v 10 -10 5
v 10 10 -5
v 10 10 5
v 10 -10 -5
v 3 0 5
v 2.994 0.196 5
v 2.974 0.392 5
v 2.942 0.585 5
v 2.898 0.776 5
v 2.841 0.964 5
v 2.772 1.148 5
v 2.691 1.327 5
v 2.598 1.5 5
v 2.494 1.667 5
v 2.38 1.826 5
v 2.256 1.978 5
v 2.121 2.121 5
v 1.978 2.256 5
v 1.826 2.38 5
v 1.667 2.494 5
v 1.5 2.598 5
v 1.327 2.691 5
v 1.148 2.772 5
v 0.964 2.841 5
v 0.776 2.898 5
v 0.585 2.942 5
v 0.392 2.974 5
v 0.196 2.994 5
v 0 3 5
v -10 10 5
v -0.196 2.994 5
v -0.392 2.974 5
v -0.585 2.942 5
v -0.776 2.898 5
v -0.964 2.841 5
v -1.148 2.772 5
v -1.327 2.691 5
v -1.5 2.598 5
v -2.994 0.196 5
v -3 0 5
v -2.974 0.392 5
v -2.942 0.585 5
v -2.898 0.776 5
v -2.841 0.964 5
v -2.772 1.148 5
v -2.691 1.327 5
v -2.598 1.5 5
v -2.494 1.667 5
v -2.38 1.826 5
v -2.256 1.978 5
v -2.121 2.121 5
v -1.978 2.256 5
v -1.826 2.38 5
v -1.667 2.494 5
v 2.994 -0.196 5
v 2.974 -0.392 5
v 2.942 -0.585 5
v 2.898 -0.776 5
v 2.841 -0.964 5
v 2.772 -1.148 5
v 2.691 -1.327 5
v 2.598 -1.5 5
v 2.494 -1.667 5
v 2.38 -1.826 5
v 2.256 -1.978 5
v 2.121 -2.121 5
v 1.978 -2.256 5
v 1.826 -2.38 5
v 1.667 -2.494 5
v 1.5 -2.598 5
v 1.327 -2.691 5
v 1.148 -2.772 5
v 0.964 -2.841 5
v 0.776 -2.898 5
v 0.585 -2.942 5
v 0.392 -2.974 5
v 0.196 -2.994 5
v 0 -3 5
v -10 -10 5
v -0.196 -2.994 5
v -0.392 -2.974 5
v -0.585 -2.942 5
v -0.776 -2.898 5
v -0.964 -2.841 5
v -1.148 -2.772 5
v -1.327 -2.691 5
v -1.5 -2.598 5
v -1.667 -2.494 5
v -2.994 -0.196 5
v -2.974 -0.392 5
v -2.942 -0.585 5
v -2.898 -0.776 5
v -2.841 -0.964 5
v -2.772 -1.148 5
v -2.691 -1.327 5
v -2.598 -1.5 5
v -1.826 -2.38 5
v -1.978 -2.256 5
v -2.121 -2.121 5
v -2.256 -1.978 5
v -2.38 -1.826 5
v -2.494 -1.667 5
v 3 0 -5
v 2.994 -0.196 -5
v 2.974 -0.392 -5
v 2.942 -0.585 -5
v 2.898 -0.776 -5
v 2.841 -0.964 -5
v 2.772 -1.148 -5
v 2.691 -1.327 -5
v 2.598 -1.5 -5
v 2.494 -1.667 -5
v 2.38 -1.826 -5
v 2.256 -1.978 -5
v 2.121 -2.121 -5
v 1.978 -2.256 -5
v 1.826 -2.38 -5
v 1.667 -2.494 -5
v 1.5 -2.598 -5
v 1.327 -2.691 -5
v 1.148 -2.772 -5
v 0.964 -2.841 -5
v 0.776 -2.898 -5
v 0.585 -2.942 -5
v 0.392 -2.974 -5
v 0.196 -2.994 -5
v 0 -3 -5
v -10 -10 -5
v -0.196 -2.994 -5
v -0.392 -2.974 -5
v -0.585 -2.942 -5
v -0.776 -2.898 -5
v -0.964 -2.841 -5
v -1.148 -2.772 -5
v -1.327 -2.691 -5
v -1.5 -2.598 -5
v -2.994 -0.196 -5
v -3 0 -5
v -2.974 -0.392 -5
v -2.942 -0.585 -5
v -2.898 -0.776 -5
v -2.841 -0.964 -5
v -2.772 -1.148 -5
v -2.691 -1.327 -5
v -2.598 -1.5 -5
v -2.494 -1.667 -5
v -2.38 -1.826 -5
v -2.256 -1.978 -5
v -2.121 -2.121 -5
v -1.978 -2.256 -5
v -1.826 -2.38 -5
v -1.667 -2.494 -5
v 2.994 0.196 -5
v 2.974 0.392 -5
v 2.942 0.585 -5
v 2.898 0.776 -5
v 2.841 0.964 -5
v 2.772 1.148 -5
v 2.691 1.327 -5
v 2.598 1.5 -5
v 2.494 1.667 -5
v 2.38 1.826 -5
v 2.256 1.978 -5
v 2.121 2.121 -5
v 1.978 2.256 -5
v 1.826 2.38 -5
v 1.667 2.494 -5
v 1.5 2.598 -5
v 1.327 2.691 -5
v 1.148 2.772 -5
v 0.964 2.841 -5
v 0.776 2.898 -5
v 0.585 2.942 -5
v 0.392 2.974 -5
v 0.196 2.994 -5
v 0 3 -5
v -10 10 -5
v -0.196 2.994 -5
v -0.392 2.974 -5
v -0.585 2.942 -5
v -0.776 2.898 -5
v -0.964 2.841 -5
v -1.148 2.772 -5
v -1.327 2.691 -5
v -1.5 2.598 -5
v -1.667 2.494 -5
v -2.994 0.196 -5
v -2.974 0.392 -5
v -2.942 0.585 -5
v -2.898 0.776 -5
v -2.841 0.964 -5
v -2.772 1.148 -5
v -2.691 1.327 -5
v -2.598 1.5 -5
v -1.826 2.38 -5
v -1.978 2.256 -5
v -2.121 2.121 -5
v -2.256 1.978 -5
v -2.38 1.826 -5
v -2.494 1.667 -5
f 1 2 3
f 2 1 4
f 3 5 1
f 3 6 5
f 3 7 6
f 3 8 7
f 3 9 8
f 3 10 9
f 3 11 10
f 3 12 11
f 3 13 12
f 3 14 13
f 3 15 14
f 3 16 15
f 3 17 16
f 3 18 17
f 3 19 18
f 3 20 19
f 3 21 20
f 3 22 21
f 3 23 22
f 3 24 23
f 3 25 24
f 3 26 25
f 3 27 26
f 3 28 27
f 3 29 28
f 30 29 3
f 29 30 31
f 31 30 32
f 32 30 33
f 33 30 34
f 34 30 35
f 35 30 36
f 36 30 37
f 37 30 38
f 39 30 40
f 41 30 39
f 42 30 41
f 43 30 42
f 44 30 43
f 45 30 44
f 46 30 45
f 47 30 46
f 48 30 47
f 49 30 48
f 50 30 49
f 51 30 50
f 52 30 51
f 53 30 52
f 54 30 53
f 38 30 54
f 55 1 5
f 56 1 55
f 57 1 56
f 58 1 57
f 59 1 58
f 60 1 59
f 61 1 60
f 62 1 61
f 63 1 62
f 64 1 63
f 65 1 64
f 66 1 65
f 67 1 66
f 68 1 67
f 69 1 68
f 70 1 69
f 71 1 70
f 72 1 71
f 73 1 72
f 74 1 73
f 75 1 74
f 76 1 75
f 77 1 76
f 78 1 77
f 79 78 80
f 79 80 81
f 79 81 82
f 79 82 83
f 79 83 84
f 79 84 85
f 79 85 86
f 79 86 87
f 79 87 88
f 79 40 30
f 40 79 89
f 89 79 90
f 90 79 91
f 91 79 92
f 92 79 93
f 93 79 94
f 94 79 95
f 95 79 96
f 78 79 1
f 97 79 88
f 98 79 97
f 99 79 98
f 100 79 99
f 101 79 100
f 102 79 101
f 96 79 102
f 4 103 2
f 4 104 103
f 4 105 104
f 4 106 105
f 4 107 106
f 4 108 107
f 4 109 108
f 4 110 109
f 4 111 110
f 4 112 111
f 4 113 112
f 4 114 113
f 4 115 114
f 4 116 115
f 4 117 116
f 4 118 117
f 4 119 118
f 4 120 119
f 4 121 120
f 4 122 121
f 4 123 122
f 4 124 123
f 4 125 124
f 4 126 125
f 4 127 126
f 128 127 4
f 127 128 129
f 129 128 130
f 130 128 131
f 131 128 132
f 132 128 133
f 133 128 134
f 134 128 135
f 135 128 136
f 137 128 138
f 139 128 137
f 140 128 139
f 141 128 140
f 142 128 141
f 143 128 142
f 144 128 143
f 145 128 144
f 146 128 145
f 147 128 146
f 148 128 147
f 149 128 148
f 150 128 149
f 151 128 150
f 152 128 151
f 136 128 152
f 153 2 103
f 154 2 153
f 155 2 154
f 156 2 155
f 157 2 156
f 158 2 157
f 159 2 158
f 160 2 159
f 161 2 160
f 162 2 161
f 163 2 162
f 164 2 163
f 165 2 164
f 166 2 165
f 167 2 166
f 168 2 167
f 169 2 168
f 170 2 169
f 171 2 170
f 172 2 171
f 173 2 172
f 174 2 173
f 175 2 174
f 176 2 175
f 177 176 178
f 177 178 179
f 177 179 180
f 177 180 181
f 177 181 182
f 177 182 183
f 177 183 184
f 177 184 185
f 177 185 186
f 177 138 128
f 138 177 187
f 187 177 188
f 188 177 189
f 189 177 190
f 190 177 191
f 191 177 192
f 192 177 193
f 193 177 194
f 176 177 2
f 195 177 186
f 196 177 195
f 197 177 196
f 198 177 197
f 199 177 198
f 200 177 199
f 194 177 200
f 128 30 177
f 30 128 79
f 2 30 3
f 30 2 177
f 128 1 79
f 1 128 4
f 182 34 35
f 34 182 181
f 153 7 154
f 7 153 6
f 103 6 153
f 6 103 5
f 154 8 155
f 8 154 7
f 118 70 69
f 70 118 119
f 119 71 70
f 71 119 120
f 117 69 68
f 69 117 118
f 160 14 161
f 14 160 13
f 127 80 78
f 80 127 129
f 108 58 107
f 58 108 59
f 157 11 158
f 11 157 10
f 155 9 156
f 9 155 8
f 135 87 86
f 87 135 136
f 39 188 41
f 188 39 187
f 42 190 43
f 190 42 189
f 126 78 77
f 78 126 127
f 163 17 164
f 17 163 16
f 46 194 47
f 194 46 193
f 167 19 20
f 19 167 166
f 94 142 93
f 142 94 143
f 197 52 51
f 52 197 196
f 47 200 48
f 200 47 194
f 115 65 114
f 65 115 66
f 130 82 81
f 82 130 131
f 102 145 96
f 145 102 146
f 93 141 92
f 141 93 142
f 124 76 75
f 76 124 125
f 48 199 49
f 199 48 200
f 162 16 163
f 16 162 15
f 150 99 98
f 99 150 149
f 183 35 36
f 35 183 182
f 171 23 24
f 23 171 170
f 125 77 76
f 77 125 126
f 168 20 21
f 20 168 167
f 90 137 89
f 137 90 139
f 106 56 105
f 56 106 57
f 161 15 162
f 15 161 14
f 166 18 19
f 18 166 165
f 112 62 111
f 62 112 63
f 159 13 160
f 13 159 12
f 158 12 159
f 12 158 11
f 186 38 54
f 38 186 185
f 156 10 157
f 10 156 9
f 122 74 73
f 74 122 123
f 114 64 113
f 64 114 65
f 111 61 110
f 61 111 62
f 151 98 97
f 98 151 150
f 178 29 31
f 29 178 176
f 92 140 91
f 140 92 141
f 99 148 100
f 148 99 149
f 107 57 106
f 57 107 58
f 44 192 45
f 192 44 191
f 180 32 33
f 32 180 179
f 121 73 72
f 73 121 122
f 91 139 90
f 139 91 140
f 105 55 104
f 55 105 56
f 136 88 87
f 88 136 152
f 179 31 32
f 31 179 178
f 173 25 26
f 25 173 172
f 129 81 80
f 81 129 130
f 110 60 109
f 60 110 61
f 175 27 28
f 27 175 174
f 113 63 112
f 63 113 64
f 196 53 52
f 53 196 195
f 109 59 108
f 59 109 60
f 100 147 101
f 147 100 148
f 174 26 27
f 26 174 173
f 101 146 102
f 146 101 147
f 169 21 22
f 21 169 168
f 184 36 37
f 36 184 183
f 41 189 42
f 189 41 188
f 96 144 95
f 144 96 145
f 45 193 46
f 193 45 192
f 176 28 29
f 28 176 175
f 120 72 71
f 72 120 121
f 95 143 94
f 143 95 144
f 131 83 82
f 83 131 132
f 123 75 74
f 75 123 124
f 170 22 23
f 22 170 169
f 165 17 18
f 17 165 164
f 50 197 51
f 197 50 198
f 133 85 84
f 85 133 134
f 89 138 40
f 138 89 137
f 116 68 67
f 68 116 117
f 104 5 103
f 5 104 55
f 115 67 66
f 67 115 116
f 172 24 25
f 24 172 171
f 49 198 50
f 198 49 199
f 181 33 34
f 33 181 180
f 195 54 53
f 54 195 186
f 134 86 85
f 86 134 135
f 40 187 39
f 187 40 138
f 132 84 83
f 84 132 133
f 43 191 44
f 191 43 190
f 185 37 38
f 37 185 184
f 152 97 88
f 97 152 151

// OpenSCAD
// Test-only fixture for proof.docker.test.ts (Issue #91, S3-B ticket B5).
//
// Neither the repository's clamp (evals/scenario-a2/fixture/clamp.scad,
// `pipe_dia`) nor hinge (evals/surface-inspection/fixture/hinge.scad,
// `pin_d`) fixture has a Customizer parameter whose VALUE is a true
// radius — both control diameter directly. This minimal fixture exists
// solely to give the proof service's radius-meaning radial check
// real-engine evidence (not mock-only), per the Tech Lead's plan
// correction. Kept next to proof.docker.test.ts, not under the
// repository's user-facing eval fixtures or apps/server project data.
//
// SPDX-License-Identifier: Apache-2.0

/* [Boss] */
// Bore radius (mm)
bore_r = 3; // [1:0.5:8]

difference() {
  cube([20, 20, 10], center = true);
  cylinder(r = bore_r, h = 12, center = true, $fn = 96);
}
